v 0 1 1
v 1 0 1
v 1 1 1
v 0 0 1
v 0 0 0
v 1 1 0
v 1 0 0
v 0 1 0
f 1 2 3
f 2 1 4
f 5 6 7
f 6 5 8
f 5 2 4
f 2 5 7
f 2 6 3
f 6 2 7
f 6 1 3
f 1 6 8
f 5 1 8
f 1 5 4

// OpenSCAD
// file: ../params.scad
// FEEL greenfield V1 — millimetres/degrees. NOT recovered original CAD.
// All hardware fit values are UNMEASURED. See README before printing.
measurements_confirmed = false;
horn_fit_confirmed = false;
$fn = 48;
epsilon = 0.02;
columns = 7;
rows = 4;
pitch = 12;
row_y0 = -8;                  // New layout assumption: room for wrist-side servos.
body_w = 88.6;
body_l = 88.8;
body_h = 35;
corner_r = 9;
bottom_chamfer = 3;
finger_edge_r = 3;
wall = 2.5;
floor_h = 2.5;
face_t = 2.5;
dome_h = 3;
dome_radius = 43.5;           // Spherical cap footprint; corners remain flat.
strap_span = 101;
strap_w = 25;
strap_slot = 2.5;
second_strap = false;         // v7 prose said off, despite showing true in its table.
finger_scallops = false;
keep_lower_tab = false;
hole_d = 4.366;               // Nominal 11/64 inch FINISHED hole, not printer proof.
pin_d = 4.2;
pin_tip_r = 2.1;
pin_foot_tip_d = 0.6;
pin_cone_half_angle = 30;     // Assumption: 30 degrees from axis (60 included).
pin_collar_d = 6;
pin_collar_h = 0.5;
pin_collar_z = 6.7;           // From low pin foot; gives 4→2mm foam cavity.
rest_proud = -1.5;
stroke = 2;
band_angles = [0, 58, 117, 175];
gap_angles = [29, 87.5, 146];
tap_degrees = 21;
cam_base_r = 3.8;
cam_half_width = 24;
cam_exponents = [2.2, 2.5, 1.6]; // A / H (flatter crest) / G (lower flank slope).
cam_step = 1;                // Actual polygon resolution, also used by cam_sim.
cam_t = 3;
shaft_d = 3;
shaft_flat = 1.0;            // D flat plane X=+1mm, shaft radius 1.5mm.
shaft_length = 58;
shaft_origin_y = 38;
shaft_axis_z = 17.5;
bearing_clearance = 0.35;
bearing_y = [-13, 35];
bearing_t = 3;
guide_z = 26.7;
guide_t = 1.2;               // New thin-guide assumption; stiffness unverified.
screw_d = 3.3;
screw_pilot_d = 2.7;
screw_x = 40.5;
screw_y = [-14, -2, 10, 34];
foam_h = 5;                 // Two 3+2mm strips are a TEST; preload is unverified.
servo_case_w = 8.3;         // Overall manufacturer B; measure actual case.
servo_case_z = 20;          // Overall manufacturer A, oriented upright.
servo_case_depth = 13.3;    // UNMEASURED case alone; published C=17.3 includes shaft.
servo_face_y = -25;
servo_axis_from_top = 5;    // UNMEASURED
servo_tab_span = 26;        // UNMEASURED
servo_tab_t = 1.5;          // UNMEASURED
servo_tab_from_face = 1.5;  // UNMEASURED
servo_spline_d = 3.8;       // UNMEASURED — do not force a printed spline.
servo_spline_h = 2.5;       // UNMEASURED
servo_spline_teeth = 20;    // Manufacturer spec; tooth shape remains unmeasured.
fit_clearance = 0.3;
horn_hub_d = 4.7;           // UNMEASURED
horn_hub_h = 2.2;           // UNMEASURED
horn_arm_w = 3.2;           // UNMEASURED
horn_arm_t = 1.2;           // UNMEASURED
horn_hole_radius = 3.2;     // UNMEASURED
coupling_d = 10;
coupling_h = 7;
coupling_shaft_depth = 4;
pack_breadboard_w = 55;     // UNMEASURED 400-point board envelope.
pack_breadboard_l = 82;
pack_w = 68;
pack_l = 112;
pack_h = 13;
pack_floor = 3;
pack_adapter_w = 22;        // UNMEASURED
pack_adapter_l = 15;
pack_cap_d = 14;            // UNMEASURED

function col_x(c) = (c - (columns-1)/2)*pitch;
function row_y(r) = row_y0 + r*pitch;
function dome_R() = (dome_radius*dome_radius+dome_h*dome_h)/(2*dome_h);
function dome_at(x,y) = dome_h <= 0 || x*x+y*y >= dome_radius*dome_radius ? 0 :
    sqrt(dome_R()*dome_R()-x*x-y*y) - (dome_R()-dome_h);
function pin_length(c,r,domed=true) = body_h + rest_proud +
    (domed ? dome_at(col_x(c),row_y(r)) : 0) - (shaft_axis_z+cam_base_r);
function angular_distance(a,b) = abs(((a-b+540)%360)-180);
function cam_radius(theta,band,variant=0) = cam_base_r + stroke *
    max(0,1-pow(angular_distance(theta,90+band_angles[band])/cam_half_width,cam_exponents[variant]));
function cam_points(band,variant=0) = [for(a=[0:cam_step:360-cam_step])
    [cam_radius(a,band,variant)*cos(a),cam_radius(a,band,variant)*sin(a)]];
function screw_positions() = [for(x=[-screw_x,screw_x],y=screw_y) [x,y]];
// file: ../lib.scad
include <params.scad>

module rounded_rect(w,l,r) {
    assert(w>2*r && l>2*r);
    hull() for(x=[-w/2+r,w/2-r],y=[-l/2+r,l/2-r]) translate([x,y]) circle(r=r);
}
module rounded_box(w,l,h,r=3) { linear_extrude(h) rounded_rect(w,l,r); }
module bore_y(d,length) { rotate([90,0,0]) cylinder(d=d,h=length,center=true); }
module d_shaft(h,clearance=0) {
    intersection() {
        cylinder(d=shaft_d+clearance,h=h);
        translate([-shaft_d,-shaft_d,-epsilon]) cube([shaft_d+shaft_flat+clearance/2,2*shaft_d,h+2*epsilon]);
    }
}
module camshaft(variant=0) {
    assert(2*(cam_base_r+stroke)<pitch,"Adjacent nominal cam envelopes overlap");
    union() {
        cylinder(d=shaft_d,h=shaft_length-coupling_shaft_depth);
        translate([0,0,shaft_length-coupling_shaft_depth-epsilon]) d_shaft(coupling_shaft_depth+epsilon);
        for(r=[0:rows-1]) translate([0,0,shaft_origin_y-row_y(r)-cam_t/2])
            linear_extrude(cam_t) polygon(cam_points(r,variant));
    }
}
module shaft_in_place(c=0,angle=0,variant=0) {
    translate([col_x(c),shaft_origin_y,shaft_axis_z]) rotate([0,angle,0]) rotate([90,0,0]) camshaft(variant);
}
module pin(len=12.2,tip_r=pin_tip_r) {
    cone_h=(pin_d-pin_foot_tip_d)/2/tan(pin_cone_half_angle);
    assert(len>cone_h+tip_r+1);
    union() {
        cylinder(d1=pin_foot_tip_d,d2=pin_d,h=cone_h);
        translate([0,0,cone_h-epsilon]) cylinder(d=pin_d,h=len-tip_r-cone_h+epsilon-0.6);
        translate([0,0,len-tip_r-0.6-epsilon]) cylinder(d1=pin_d,d2=2*tip_r,h=0.6+2*epsilon);
        translate([0,0,len-tip_r]) intersection() {
            sphere(r=tip_r);
            translate([-tip_r,-tip_r,-epsilon]) cube([2*tip_r,2*tip_r,tip_r+epsilon]);
        }
        translate([0,0,pin_collar_z]) cylinder(d=pin_collar_d,h=pin_collar_h);
    }
}
module pin_plate(nc=7,tip_r=pin_tip_r,domed=true) {
    plate_w=(nc-1)*pitch+10;
    ymid=(row_y(0)+row_y(rows-1))/2;
    // Breakaway frame, runners and foot tabs keep every pin one connected mesh.
    difference() {
        translate([0,ymid,0]) rounded_box(plate_w,rows*pitch+6,1,2);
        translate([0,ymid,-epsilon]) rounded_box(plate_w-3,rows*pitch+3,1+2*epsilon,1);
    }
    for(c=[0:nc-1]) {
        x=(c-(nc-1)/2)*pitch;
        translate([x,row_y(rows-1)+8.2,0.85]) linear_extrude(0.45)
            text(nc==1?"TEST":str("C",c),size=1.5,halign="center",valign="center");
        translate([x+3.2,row_y(0)-8,0]) cube([1.4,(rows-1)*pitch+16,1]);
        for(r=[0:rows-1]) {
            translate([x,row_y(r),0]) pin(domed ? pin_length(c,r,true) : pin_length(3,r,false),tip_r);
            translate([x,row_y(r)-0.35,0.35]) cube([3.8,0.7,0.45]);
        }
    }
}
module lower_bearing(x,y) {
    difference() {
        translate([x-4.2,y-bearing_t/2,floor_h-epsilon]) cube([8.4,bearing_t,shaft_axis_z-floor_h+epsilon]);
        translate([x,y,shaft_axis_z]) bore_y(shaft_d+bearing_clearance,bearing_t+2*epsilon);
    }
}
module upper_bearing(x,y) {
    difference() {
        translate([x-4.2,y-bearing_t/2,shaft_axis_z]) cube([8.4,bearing_t,guide_z-shaft_axis_z+epsilon]);
        translate([x,y,shaft_axis_z]) bore_y(shaft_d+bearing_clearance,bearing_t+2*epsilon);
    }
}
module servo_nominal() {
    bottom=shaft_axis_z-(servo_case_z-servo_axis_from_top);
    translate([-servo_case_w/2,servo_face_y-servo_case_depth,bottom]) cube([servo_case_w,servo_case_depth,servo_case_z]);
    translate([-servo_case_w/2,servo_face_y-servo_tab_from_face-servo_tab_t,bottom+servo_case_z]) cube([servo_case_w,servo_tab_t,(servo_tab_span-servo_case_z)/2]);
    if(keep_lower_tab) translate([-servo_case_w/2,servo_face_y-servo_tab_from_face-servo_tab_t,bottom-(servo_tab_span-servo_case_z)/2]) cube([servo_case_w,servo_tab_t,(servo_tab_span-servo_case_z)/2]);
    translate([0,servo_face_y+servo_spline_h/2,shaft_axis_z]) bore_y(servo_spline_d,servo_spline_h+epsilon);
}
module coupling(kind=1) {
    clear=fit_clearance+(kind==2?0.2:0);
    difference() {
        cylinder(d=coupling_d,h=coupling_h);
        // Bed side mates to the D-shaft; top side captures a measured horn.
        translate([0,0,-epsilon]) d_shaft(coupling_shaft_depth+epsilon,clear);
        if(kind<3) {
            translate([0,0,coupling_h-horn_hub_h]) cylinder(d=horn_hub_d+clear,h=horn_hub_h+epsilon);
            translate([-coupling_d/2-epsilon,-(horn_arm_w+clear)/2,coupling_h-horn_arm_t]) cube([coupling_d+2*epsilon,horn_arm_w+clear,horn_arm_t+epsilon]);
            // Two tie holes hold a real horn arm; the supplied centre screw stays accessible.
            for(x=[-horn_hole_radius-0.4,horn_hole_radius+0.4]) translate([x,0,coupling_h-horn_hub_h-0.4]) cylinder(d=1.2,h=horn_hub_h+1);
        } else {
            // SIZING COUPON ONLY: smooth nominal bore, NOT a reproduced 20T spline.
            translate([0,0,coupling_h-servo_spline_h]) cylinder(d=servo_spline_d+clear,h=servo_spline_h+epsilon);
        }
        translate([0,0,-epsilon]) cylinder(d=1.6,h=coupling_h+2*epsilon);
    }
}
module foam_template(nc=7) {
    w=nc==1?9:(columns-1)*pitch+9;
    difference() {
        translate([0,(row_y(0)+row_y(rows-1))/2,0]) rounded_box(w,rows*pitch+1,1.2,1.5);
        for(c=[0:nc-1],r=[0:rows-1]) translate([(c-(nc-1)/2)*pitch,row_y(r),-epsilon]) cylinder(d=hole_d,h=1.2+2*epsilon);
        if(nc>1) for(c=[0:columns-2]) translate([col_x(c)+pitch/2-0.25,row_y(0)-3,0.6]) cube([0.5,(rows-1)*pitch+6,0.7]);
    }
}
// main file
// Emit precisely the polygon vertices the STL generator uses.
include <../lib.scad>
echo(["PARAMETERS",band_angles,gap_angles,tap_degrees,cam_base_r,stroke,pin_d/2,pin_foot_tip_d/2,pin_cone_half_angle,pitch,cam_step]);
for(v=[0:2],b=[0:3]) echo(["PROFILE",v,b,cam_points(b,v)]);
cube([1,1,1]);
